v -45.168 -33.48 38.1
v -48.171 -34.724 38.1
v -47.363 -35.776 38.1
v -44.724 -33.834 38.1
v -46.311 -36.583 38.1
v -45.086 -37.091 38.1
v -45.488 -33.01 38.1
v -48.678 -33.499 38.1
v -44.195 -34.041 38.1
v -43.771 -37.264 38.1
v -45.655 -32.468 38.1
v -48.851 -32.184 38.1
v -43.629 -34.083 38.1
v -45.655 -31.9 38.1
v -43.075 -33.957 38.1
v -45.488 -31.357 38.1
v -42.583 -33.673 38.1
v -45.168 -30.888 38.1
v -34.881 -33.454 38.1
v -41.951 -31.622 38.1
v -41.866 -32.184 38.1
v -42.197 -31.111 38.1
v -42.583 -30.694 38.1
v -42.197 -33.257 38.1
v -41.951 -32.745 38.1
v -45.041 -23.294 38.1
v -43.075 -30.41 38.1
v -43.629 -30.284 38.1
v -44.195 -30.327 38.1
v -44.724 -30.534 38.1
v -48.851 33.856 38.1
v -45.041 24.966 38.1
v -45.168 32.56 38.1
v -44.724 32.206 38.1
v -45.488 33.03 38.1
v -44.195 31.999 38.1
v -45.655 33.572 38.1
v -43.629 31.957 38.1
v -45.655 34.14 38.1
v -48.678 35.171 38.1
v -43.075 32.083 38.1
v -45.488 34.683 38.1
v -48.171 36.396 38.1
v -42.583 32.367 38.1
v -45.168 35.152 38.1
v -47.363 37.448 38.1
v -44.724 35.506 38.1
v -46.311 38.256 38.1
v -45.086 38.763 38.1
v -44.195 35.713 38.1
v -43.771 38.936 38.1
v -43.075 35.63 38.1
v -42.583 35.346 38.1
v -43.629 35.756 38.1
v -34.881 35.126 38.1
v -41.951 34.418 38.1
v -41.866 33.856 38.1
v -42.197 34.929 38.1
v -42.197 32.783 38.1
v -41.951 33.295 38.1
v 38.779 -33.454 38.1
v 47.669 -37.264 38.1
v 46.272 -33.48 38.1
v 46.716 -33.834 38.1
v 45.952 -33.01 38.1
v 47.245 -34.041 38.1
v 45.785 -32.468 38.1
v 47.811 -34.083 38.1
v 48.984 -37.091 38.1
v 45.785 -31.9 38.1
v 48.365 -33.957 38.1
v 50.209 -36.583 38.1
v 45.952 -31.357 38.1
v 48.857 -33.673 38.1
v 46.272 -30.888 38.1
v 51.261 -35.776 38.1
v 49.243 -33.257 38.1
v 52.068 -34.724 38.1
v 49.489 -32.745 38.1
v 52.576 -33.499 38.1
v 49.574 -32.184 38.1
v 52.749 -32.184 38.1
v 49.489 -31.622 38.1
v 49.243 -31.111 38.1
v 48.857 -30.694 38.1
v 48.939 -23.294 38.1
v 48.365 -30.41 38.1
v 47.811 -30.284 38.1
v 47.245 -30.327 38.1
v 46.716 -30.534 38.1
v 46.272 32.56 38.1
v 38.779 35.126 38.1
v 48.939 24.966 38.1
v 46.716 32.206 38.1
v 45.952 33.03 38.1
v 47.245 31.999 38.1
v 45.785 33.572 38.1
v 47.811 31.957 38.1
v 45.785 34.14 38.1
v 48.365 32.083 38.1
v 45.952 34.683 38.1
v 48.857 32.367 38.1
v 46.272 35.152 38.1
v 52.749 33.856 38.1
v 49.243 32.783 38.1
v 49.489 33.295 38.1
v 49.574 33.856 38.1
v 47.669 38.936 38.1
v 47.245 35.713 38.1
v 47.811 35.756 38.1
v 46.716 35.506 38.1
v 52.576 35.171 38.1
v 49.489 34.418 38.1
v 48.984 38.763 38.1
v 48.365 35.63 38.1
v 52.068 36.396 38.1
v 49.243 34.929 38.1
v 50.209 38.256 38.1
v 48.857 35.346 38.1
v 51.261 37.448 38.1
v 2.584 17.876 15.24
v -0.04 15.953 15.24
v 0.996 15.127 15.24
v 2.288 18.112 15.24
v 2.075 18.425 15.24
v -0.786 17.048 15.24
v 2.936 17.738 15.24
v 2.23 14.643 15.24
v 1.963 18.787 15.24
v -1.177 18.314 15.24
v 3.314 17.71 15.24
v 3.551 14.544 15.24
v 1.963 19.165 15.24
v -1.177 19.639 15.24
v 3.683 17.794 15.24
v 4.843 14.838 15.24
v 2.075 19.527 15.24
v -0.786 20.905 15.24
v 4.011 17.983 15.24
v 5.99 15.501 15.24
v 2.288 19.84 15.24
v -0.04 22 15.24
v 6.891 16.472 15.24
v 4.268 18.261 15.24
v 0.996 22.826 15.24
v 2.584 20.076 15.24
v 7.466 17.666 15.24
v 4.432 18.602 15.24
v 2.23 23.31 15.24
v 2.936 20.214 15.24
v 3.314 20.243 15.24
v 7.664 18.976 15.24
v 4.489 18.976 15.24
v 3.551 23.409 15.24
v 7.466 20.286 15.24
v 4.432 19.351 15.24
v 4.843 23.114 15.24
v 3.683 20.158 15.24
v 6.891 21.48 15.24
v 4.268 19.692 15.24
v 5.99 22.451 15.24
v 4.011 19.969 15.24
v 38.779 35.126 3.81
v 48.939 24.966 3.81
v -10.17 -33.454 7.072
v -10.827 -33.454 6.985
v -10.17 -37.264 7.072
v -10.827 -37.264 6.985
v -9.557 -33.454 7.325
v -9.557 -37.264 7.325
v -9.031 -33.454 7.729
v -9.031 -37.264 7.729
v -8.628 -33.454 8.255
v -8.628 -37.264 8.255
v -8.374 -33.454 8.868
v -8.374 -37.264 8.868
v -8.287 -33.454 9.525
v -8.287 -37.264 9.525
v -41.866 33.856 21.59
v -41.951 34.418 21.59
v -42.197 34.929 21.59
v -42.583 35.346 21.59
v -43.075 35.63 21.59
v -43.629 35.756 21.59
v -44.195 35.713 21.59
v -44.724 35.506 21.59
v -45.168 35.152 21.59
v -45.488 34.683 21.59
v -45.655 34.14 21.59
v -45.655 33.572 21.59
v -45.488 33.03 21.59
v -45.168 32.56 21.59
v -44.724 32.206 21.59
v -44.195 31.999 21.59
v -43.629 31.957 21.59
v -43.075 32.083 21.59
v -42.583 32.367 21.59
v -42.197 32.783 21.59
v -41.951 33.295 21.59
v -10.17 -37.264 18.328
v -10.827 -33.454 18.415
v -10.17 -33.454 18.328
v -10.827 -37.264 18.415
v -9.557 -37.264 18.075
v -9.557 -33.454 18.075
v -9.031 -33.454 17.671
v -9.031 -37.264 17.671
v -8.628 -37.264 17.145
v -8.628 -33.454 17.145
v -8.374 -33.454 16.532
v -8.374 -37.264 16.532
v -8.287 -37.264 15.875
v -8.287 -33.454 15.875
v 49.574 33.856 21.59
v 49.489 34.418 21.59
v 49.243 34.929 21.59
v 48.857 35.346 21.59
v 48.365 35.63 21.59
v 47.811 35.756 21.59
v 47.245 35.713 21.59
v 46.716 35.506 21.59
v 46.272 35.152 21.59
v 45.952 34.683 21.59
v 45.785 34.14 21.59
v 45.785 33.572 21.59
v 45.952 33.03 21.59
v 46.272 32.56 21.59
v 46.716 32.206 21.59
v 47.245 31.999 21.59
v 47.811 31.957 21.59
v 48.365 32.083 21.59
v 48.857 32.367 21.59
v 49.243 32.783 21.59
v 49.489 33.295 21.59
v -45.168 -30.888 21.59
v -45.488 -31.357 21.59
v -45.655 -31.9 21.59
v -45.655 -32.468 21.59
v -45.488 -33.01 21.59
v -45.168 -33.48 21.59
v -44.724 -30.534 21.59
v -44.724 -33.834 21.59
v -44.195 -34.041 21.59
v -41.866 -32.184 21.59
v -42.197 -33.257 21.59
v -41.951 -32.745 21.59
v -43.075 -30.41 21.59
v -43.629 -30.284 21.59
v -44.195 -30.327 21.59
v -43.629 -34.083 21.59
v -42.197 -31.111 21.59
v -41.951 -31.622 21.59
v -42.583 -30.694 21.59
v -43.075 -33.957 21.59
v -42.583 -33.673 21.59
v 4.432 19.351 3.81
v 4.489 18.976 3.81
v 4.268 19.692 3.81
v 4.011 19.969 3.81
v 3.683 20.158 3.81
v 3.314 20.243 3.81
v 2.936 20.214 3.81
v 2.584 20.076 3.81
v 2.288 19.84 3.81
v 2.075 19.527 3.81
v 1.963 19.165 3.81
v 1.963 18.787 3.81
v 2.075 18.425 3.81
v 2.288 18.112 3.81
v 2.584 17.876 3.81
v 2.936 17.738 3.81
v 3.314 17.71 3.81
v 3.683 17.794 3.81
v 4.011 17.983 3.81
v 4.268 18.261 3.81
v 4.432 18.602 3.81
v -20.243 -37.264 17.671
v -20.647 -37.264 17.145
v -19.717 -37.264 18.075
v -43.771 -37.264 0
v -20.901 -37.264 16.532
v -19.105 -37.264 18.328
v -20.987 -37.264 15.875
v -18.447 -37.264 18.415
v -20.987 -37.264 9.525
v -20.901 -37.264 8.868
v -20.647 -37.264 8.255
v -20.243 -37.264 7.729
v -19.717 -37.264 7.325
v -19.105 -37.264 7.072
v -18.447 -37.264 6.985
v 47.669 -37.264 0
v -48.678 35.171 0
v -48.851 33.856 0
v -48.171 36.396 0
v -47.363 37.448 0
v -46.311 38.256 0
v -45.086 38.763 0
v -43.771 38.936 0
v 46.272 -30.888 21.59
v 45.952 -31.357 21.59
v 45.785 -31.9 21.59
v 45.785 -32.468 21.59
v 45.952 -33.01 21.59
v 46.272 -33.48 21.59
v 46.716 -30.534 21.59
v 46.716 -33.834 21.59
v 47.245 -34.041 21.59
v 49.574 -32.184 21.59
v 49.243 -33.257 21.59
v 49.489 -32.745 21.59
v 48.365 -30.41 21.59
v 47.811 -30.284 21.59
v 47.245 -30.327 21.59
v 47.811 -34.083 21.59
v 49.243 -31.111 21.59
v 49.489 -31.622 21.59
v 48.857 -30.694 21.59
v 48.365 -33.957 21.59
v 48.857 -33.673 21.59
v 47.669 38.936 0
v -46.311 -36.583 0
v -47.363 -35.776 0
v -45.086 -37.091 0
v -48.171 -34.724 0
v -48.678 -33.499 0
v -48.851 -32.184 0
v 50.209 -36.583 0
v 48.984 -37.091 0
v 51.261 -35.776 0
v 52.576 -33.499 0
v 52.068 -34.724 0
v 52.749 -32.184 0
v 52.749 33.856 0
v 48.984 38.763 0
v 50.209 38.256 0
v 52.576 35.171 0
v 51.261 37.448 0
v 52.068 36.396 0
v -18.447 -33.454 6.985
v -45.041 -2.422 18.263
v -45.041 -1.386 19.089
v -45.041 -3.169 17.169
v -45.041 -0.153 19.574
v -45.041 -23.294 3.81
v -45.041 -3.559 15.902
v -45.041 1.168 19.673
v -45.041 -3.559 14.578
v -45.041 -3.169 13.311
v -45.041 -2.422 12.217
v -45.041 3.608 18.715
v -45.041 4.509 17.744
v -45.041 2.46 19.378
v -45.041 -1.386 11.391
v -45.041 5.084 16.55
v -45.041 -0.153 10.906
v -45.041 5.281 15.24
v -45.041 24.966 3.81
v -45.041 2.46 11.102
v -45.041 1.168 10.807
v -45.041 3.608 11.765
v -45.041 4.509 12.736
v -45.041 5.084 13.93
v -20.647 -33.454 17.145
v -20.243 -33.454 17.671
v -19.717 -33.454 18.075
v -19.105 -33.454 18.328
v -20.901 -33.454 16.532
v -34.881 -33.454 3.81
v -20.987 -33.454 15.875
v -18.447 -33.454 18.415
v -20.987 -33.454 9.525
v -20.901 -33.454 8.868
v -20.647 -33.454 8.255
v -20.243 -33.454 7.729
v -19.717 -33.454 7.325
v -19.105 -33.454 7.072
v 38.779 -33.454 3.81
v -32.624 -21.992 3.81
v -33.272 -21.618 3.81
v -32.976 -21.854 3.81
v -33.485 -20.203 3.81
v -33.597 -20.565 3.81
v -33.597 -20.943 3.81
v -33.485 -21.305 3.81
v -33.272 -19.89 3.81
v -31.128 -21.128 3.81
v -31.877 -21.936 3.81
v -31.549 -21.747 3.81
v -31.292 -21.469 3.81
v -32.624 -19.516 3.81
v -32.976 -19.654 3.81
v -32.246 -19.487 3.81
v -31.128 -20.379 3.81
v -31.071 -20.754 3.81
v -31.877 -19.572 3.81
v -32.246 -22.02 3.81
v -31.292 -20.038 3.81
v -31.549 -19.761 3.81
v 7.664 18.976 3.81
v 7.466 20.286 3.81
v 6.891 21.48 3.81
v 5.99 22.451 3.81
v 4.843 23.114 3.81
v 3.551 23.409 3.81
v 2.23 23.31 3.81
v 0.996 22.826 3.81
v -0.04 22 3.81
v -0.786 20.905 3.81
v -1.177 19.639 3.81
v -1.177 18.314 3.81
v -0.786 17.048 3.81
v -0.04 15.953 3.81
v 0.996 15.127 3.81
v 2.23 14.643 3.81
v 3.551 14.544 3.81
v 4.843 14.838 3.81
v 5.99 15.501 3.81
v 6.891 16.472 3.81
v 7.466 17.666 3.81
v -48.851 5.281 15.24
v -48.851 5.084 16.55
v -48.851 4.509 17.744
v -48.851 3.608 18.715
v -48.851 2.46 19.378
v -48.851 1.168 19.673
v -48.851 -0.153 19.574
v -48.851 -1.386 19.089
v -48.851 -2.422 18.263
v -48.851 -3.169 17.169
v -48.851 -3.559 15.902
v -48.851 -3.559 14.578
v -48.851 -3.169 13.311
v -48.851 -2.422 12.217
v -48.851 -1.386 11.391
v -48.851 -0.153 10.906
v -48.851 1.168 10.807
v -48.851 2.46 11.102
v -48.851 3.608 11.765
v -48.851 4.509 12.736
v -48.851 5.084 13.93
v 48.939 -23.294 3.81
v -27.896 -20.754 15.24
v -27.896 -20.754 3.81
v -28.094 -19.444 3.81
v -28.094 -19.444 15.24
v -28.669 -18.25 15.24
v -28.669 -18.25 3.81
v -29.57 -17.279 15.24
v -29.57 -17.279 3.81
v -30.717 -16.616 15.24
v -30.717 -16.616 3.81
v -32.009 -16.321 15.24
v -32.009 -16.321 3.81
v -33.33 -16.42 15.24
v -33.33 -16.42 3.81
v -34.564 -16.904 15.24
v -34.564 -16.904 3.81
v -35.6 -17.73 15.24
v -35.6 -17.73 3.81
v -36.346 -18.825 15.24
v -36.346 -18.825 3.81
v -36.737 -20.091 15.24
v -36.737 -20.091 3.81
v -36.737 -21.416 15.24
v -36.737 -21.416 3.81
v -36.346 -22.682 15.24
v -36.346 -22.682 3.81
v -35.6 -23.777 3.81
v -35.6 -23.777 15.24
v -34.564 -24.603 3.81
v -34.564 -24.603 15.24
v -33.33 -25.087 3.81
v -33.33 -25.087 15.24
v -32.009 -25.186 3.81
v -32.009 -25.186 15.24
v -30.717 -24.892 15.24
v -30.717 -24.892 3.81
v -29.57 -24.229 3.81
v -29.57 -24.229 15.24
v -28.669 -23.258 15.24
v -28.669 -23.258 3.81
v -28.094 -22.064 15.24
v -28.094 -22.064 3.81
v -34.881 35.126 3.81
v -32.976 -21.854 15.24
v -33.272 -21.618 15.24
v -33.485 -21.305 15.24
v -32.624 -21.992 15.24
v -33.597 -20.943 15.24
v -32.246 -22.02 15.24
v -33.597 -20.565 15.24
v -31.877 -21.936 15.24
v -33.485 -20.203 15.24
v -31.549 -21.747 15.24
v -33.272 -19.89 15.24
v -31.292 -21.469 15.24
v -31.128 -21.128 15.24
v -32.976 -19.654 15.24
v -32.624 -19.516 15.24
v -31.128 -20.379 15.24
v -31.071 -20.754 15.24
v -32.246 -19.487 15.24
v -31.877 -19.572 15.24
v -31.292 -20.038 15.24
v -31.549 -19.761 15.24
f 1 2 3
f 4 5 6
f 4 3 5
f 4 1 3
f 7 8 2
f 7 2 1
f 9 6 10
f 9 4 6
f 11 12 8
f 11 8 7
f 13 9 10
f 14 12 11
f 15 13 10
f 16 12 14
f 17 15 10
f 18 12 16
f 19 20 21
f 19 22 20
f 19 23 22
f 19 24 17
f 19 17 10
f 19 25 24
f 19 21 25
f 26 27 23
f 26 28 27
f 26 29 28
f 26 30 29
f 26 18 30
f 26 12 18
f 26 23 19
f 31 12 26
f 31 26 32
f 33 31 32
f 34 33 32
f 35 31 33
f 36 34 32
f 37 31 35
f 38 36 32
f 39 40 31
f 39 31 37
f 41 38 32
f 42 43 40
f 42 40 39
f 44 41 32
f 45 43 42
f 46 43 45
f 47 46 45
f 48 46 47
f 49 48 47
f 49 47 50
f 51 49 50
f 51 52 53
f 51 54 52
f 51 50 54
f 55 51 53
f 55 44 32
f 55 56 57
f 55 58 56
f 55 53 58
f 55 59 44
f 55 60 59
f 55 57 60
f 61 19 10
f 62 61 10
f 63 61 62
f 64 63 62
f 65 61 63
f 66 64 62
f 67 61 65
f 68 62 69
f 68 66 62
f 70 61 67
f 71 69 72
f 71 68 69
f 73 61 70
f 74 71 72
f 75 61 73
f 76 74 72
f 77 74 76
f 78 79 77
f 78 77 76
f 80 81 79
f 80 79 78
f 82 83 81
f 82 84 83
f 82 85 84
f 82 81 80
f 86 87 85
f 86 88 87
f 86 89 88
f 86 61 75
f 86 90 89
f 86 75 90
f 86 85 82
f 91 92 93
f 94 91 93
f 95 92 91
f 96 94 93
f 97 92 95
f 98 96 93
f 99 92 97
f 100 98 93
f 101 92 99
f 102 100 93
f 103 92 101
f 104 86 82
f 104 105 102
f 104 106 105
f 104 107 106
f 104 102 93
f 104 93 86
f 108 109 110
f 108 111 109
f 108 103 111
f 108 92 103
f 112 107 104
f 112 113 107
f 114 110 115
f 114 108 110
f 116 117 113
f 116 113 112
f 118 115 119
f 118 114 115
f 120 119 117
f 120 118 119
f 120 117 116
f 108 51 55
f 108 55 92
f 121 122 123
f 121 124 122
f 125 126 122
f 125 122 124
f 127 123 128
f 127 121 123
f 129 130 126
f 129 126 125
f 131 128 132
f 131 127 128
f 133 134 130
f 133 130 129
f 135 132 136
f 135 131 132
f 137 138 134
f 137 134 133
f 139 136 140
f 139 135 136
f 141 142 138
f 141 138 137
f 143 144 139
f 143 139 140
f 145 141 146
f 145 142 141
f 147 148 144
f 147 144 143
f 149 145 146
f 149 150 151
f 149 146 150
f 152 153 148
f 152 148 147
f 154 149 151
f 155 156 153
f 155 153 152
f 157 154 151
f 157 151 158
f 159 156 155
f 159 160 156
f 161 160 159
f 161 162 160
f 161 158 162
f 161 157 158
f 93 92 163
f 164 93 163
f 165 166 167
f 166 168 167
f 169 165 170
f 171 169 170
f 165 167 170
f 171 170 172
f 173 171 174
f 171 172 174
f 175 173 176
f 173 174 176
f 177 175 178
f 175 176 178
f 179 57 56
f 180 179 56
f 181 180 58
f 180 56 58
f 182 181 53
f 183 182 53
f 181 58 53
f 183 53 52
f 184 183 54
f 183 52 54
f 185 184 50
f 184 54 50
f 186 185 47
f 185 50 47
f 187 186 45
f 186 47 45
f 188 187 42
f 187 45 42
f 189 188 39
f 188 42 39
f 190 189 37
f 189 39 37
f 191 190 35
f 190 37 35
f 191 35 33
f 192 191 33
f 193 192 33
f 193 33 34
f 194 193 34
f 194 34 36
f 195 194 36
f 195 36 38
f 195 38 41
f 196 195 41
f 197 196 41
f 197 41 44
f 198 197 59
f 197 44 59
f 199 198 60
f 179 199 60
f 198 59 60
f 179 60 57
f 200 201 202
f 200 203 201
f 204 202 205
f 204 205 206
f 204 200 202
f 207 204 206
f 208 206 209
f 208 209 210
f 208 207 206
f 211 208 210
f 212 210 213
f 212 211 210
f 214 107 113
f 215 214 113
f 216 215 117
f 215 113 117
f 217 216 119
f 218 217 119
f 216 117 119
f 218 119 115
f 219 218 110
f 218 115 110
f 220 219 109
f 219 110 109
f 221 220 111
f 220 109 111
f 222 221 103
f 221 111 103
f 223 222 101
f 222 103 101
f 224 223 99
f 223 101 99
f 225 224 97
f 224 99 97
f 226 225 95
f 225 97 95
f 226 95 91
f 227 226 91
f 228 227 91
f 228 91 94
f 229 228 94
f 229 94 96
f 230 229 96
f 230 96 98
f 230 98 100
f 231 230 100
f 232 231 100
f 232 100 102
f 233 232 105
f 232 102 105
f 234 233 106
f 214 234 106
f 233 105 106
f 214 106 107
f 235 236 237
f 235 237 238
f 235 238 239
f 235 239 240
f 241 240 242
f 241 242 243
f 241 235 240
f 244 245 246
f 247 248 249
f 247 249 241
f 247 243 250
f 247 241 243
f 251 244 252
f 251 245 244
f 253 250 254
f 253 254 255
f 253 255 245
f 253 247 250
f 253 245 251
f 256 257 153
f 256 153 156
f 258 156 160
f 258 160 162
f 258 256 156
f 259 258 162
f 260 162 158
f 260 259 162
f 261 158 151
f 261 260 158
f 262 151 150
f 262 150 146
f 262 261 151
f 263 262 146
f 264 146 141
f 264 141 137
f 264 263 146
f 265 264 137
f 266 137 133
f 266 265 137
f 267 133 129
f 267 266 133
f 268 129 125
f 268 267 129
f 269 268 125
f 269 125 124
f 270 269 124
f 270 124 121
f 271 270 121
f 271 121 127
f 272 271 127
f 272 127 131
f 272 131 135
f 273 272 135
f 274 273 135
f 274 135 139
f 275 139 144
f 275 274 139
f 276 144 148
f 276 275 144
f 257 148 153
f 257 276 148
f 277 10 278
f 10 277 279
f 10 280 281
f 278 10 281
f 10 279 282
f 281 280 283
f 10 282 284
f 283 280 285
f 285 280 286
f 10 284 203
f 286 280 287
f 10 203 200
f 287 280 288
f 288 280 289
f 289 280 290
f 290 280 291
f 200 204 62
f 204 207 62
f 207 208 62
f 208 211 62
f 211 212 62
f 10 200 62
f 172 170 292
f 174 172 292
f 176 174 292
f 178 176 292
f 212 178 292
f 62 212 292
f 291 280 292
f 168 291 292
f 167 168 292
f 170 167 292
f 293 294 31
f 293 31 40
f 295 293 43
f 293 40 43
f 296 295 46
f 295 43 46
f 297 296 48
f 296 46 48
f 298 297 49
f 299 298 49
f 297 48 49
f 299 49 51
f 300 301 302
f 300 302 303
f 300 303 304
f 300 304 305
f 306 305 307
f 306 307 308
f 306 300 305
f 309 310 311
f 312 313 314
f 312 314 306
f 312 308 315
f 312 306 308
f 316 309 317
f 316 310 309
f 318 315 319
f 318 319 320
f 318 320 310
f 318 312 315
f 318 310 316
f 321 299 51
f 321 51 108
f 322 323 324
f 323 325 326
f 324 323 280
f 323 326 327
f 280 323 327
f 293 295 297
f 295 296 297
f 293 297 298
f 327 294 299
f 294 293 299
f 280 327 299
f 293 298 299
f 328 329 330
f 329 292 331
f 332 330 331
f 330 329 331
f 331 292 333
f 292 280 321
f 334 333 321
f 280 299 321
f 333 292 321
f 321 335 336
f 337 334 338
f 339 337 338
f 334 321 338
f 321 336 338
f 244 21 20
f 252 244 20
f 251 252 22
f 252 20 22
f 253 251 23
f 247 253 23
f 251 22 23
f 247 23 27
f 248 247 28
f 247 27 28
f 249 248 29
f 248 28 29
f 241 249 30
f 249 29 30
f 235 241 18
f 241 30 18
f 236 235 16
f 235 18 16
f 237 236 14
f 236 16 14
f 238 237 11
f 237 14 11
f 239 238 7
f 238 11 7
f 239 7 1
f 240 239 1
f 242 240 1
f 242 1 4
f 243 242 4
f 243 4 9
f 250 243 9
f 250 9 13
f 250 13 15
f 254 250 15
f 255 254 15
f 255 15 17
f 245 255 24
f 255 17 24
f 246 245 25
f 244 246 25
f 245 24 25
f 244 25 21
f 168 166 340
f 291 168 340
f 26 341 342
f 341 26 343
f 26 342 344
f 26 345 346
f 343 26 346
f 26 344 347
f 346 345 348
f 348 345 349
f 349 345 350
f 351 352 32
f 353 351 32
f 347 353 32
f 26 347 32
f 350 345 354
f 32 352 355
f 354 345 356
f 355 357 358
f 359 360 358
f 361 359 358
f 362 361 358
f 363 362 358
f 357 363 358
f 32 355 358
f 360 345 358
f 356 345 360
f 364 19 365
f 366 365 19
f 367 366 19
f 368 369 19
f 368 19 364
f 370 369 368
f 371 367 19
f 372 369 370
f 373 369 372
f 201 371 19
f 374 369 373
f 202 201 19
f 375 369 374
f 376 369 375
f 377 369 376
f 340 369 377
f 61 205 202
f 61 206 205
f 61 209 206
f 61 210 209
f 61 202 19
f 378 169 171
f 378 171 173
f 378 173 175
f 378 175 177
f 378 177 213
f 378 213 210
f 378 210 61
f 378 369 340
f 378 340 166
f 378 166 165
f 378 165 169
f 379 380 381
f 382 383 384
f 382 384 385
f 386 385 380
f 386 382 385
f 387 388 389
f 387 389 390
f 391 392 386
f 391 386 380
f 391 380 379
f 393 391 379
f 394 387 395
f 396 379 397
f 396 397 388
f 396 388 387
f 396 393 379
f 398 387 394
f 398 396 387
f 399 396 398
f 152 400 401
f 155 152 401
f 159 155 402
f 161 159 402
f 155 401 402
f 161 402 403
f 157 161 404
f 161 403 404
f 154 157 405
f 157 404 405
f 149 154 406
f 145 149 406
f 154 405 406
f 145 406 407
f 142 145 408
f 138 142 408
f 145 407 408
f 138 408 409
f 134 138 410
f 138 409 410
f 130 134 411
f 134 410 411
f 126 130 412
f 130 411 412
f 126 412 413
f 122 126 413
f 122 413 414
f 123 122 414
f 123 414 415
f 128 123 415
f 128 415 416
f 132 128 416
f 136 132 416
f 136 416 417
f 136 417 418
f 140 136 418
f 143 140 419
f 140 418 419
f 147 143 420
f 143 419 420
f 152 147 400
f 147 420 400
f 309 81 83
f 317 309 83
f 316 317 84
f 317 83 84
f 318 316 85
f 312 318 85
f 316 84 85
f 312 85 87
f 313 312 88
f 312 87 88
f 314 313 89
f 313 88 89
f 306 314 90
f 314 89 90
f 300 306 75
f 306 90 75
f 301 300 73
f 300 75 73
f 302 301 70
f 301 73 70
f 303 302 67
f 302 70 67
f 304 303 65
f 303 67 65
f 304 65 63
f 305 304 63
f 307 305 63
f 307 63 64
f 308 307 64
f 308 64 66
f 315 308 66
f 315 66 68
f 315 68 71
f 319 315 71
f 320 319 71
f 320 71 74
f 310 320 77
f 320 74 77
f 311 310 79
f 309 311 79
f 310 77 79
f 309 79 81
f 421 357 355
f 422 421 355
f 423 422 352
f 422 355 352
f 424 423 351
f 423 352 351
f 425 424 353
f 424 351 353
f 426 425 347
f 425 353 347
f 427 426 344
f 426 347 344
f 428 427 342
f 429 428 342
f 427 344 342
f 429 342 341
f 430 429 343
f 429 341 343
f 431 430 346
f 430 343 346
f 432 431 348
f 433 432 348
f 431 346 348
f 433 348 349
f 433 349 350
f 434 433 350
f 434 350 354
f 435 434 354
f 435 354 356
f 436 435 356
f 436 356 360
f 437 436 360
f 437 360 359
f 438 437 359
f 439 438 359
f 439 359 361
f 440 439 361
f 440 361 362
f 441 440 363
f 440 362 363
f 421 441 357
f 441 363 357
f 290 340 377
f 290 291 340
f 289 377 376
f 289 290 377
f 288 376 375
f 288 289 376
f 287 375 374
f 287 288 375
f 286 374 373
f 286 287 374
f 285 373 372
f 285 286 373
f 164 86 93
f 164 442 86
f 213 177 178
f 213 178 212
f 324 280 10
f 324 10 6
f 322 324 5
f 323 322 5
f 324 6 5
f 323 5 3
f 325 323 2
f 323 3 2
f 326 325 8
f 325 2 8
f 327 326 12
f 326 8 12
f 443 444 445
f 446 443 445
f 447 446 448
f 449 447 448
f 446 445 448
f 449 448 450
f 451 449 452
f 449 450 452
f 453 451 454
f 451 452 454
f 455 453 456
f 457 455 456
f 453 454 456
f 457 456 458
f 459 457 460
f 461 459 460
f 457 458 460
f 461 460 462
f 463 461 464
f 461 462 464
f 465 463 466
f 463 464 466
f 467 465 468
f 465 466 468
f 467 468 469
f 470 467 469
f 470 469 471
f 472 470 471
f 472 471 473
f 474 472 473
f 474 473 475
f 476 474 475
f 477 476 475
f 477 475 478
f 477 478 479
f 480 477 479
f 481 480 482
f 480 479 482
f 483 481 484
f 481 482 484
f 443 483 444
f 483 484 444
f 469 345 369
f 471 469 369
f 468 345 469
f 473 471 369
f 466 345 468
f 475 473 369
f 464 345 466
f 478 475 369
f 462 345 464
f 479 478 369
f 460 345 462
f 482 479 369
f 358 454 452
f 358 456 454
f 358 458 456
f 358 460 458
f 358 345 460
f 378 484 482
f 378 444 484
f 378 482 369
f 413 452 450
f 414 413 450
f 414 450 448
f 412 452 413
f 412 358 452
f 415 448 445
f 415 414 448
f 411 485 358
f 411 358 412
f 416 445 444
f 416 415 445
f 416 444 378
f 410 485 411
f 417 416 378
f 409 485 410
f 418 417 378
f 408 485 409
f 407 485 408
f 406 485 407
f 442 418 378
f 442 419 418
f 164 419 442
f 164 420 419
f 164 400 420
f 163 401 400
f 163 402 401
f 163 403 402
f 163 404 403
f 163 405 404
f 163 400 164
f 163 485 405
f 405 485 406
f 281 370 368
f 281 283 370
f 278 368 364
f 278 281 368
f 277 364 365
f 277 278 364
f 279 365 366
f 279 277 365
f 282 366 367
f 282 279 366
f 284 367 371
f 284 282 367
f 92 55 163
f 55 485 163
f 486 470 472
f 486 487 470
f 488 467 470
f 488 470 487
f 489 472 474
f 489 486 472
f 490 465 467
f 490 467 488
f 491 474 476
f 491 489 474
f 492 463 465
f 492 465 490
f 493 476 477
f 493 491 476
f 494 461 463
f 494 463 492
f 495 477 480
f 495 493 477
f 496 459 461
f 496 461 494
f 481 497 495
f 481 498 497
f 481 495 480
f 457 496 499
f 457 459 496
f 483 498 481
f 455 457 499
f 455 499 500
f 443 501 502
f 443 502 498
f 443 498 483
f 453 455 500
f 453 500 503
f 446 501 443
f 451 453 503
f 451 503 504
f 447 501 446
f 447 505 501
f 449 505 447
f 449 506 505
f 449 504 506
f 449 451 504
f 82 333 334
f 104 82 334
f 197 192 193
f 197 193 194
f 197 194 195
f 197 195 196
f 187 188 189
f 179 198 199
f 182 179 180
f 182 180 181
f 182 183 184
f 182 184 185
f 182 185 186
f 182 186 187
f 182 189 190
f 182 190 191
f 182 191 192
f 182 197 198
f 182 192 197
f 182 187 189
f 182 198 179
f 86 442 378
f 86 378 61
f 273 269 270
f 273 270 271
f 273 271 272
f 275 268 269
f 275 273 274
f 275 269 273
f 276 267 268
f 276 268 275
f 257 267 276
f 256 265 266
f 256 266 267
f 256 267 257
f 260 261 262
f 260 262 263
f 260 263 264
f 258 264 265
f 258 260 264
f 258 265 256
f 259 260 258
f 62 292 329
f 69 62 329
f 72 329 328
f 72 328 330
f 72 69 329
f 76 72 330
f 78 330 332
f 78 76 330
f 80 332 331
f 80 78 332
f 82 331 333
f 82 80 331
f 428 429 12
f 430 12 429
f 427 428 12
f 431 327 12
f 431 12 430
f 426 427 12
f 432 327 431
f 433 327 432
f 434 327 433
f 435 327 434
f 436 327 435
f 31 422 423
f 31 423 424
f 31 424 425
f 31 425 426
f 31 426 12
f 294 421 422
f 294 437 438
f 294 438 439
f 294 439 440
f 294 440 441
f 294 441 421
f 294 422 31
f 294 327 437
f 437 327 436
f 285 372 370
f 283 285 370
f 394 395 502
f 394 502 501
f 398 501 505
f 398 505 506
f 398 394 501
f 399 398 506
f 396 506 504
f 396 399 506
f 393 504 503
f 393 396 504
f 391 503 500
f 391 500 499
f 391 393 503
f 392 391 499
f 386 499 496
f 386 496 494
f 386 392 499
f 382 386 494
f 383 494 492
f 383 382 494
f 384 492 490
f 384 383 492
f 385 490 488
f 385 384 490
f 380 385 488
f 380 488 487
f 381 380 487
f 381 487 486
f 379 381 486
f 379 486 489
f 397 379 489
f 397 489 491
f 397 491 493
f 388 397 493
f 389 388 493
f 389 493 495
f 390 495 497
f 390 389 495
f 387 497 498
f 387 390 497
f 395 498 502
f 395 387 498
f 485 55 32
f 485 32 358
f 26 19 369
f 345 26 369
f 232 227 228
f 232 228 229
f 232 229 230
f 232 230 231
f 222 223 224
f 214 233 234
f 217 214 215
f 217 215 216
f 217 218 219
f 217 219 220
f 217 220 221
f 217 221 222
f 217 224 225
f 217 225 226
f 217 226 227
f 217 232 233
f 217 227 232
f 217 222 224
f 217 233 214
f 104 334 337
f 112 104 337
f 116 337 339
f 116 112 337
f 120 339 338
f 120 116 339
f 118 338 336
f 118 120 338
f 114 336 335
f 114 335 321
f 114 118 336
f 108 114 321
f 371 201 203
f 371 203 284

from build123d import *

# Parameters (mm, degrees)
F0_W      = 101.6
F0_H      = 76.2
F1_DEPTH  = 38.1
F2_T      = -3.81
F3_SIZE   = 10.16
F4_R      = 4.445
F4_R_2    = 1.27
F6_DEPTH  = 11.43
F5_R      = 4.445
F7_DEPTH  = 3.81
F8_W      = 12.7
F8_H      = 11.43
F9_DEPTH  = 3.81
F10_R     = 2.54
F11_R     = 5.08
F12_R     = 1.905
F13_DEPTH = 16.51


with BuildPart() as f1:
    # F0 (on Top) → F1 (new body)
    with BuildSketch(Plane.XY):
        with Locations((1.9488222897, 0.8362135466)):
            Rectangle(F0_W, F0_H)
    extrude(amount=F1_DEPTH)

    # F2
    f2_openings = [f1.faces().sort_by_distance(p)[0] for p in [
        (1.948822, 0.836214, 38.1),
    ]]
    offset(amount=F2_T, openings=f2_openings)

    # F3
    f3_edges = [f1.edges().sort_by_distance(p)[0] for p in [
        (-45.041178, 35.126214, 20.955),
        (48.938822, 35.126214, 20.955),
        (48.938822, -33.453786, 20.955),
        (-45.041178, -33.453786, 20.955),
    ]]
    chamfer(f3_edges, length=F3_SIZE)

    # F4 (on face) → F6 (join)
    with BuildSketch(Plane.XY.offset(3.81)):
        with Locations((-32.3411777103, -20.7537864534)):
            Circle(F4_R)
        with Locations((-32.3411777103, -20.7537864534)):
            Circle(F4_R_2, mode=Mode.SUBTRACT)
        with Locations((3.2188222897, 18.9762135466)):
            Circle(F4_R)
        with Locations((3.2188222897, 18.9762135466)):
            Circle(F4_R_2, mode=Mode.SUBTRACT)
    extrude(amount=F6_DEPTH)

    # F5 (on face) → F7 (cut, through all)
    with BuildSketch(Plane.YZ.offset(-45.0411777103)):
        with Locations((0.8362135466, 15.24)):
            Circle(F5_R)
    extrude(amount=-F7_DEPTH, mode=Mode.SUBTRACT)

    # F8 (on face) → F9 (cut, through all)
    with BuildSketch(Plane(origin=(0, -33.4537864534, 0), x_dir=(-1, 0, 0), z_dir=(0, 1, 0))):
        with Locations((14.6373170428, 12.7)):
            Rectangle(F8_W, F8_H)
    extrude(amount=-F9_DEPTH, mode=Mode.SUBTRACT)

    # F10
    f10_edges = [f1.edges().sort_by_distance(p)[0] for p in [
        (-8.287317, -35.358786, 6.985),
        (-20.987317, -35.358786, 6.985),
        (-20.987317, -35.358786, 18.415),
        (-8.287317, -35.358786, 18.415),
    ]]
    fillet(f10_edges, radius=F10_R)

    # F11
    f11_edges = [f1.edges().sort_by_distance(p)[0] for p in [
        (-48.851178, -37.263786, 19.05),
        (52.748822, -37.263786, 19.05),
        (52.748822, 38.936214, 19.05),
        (-48.851178, 38.936214, 19.05),
    ]]
    fillet(f11_edges, radius=F11_R)

    # F12 (on face) → F13 (cut)
    with BuildSketch(Plane.XY.offset(38.1)):
        with Locations((-43.7711777103, 33.8562135466)):
            Circle(F12_R)
        with Locations((-43.7711777103, -32.1837864534)):
            Circle(F12_R)
        with Locations((47.6688222897, 33.8562135466)):
            Circle(F12_R)
        with Locations((47.6688222897, -32.1837864534)):
            Circle(F12_R)
        with Locations((139.1088222897, 33.8562135466)):
            Circle(F12_R)
        with Locations((139.1088222897, -32.1837864534)):
            Circle(F12_R)
    extrude(amount=-F13_DEPTH, mode=Mode.SUBTRACT)


solid = f1.part
